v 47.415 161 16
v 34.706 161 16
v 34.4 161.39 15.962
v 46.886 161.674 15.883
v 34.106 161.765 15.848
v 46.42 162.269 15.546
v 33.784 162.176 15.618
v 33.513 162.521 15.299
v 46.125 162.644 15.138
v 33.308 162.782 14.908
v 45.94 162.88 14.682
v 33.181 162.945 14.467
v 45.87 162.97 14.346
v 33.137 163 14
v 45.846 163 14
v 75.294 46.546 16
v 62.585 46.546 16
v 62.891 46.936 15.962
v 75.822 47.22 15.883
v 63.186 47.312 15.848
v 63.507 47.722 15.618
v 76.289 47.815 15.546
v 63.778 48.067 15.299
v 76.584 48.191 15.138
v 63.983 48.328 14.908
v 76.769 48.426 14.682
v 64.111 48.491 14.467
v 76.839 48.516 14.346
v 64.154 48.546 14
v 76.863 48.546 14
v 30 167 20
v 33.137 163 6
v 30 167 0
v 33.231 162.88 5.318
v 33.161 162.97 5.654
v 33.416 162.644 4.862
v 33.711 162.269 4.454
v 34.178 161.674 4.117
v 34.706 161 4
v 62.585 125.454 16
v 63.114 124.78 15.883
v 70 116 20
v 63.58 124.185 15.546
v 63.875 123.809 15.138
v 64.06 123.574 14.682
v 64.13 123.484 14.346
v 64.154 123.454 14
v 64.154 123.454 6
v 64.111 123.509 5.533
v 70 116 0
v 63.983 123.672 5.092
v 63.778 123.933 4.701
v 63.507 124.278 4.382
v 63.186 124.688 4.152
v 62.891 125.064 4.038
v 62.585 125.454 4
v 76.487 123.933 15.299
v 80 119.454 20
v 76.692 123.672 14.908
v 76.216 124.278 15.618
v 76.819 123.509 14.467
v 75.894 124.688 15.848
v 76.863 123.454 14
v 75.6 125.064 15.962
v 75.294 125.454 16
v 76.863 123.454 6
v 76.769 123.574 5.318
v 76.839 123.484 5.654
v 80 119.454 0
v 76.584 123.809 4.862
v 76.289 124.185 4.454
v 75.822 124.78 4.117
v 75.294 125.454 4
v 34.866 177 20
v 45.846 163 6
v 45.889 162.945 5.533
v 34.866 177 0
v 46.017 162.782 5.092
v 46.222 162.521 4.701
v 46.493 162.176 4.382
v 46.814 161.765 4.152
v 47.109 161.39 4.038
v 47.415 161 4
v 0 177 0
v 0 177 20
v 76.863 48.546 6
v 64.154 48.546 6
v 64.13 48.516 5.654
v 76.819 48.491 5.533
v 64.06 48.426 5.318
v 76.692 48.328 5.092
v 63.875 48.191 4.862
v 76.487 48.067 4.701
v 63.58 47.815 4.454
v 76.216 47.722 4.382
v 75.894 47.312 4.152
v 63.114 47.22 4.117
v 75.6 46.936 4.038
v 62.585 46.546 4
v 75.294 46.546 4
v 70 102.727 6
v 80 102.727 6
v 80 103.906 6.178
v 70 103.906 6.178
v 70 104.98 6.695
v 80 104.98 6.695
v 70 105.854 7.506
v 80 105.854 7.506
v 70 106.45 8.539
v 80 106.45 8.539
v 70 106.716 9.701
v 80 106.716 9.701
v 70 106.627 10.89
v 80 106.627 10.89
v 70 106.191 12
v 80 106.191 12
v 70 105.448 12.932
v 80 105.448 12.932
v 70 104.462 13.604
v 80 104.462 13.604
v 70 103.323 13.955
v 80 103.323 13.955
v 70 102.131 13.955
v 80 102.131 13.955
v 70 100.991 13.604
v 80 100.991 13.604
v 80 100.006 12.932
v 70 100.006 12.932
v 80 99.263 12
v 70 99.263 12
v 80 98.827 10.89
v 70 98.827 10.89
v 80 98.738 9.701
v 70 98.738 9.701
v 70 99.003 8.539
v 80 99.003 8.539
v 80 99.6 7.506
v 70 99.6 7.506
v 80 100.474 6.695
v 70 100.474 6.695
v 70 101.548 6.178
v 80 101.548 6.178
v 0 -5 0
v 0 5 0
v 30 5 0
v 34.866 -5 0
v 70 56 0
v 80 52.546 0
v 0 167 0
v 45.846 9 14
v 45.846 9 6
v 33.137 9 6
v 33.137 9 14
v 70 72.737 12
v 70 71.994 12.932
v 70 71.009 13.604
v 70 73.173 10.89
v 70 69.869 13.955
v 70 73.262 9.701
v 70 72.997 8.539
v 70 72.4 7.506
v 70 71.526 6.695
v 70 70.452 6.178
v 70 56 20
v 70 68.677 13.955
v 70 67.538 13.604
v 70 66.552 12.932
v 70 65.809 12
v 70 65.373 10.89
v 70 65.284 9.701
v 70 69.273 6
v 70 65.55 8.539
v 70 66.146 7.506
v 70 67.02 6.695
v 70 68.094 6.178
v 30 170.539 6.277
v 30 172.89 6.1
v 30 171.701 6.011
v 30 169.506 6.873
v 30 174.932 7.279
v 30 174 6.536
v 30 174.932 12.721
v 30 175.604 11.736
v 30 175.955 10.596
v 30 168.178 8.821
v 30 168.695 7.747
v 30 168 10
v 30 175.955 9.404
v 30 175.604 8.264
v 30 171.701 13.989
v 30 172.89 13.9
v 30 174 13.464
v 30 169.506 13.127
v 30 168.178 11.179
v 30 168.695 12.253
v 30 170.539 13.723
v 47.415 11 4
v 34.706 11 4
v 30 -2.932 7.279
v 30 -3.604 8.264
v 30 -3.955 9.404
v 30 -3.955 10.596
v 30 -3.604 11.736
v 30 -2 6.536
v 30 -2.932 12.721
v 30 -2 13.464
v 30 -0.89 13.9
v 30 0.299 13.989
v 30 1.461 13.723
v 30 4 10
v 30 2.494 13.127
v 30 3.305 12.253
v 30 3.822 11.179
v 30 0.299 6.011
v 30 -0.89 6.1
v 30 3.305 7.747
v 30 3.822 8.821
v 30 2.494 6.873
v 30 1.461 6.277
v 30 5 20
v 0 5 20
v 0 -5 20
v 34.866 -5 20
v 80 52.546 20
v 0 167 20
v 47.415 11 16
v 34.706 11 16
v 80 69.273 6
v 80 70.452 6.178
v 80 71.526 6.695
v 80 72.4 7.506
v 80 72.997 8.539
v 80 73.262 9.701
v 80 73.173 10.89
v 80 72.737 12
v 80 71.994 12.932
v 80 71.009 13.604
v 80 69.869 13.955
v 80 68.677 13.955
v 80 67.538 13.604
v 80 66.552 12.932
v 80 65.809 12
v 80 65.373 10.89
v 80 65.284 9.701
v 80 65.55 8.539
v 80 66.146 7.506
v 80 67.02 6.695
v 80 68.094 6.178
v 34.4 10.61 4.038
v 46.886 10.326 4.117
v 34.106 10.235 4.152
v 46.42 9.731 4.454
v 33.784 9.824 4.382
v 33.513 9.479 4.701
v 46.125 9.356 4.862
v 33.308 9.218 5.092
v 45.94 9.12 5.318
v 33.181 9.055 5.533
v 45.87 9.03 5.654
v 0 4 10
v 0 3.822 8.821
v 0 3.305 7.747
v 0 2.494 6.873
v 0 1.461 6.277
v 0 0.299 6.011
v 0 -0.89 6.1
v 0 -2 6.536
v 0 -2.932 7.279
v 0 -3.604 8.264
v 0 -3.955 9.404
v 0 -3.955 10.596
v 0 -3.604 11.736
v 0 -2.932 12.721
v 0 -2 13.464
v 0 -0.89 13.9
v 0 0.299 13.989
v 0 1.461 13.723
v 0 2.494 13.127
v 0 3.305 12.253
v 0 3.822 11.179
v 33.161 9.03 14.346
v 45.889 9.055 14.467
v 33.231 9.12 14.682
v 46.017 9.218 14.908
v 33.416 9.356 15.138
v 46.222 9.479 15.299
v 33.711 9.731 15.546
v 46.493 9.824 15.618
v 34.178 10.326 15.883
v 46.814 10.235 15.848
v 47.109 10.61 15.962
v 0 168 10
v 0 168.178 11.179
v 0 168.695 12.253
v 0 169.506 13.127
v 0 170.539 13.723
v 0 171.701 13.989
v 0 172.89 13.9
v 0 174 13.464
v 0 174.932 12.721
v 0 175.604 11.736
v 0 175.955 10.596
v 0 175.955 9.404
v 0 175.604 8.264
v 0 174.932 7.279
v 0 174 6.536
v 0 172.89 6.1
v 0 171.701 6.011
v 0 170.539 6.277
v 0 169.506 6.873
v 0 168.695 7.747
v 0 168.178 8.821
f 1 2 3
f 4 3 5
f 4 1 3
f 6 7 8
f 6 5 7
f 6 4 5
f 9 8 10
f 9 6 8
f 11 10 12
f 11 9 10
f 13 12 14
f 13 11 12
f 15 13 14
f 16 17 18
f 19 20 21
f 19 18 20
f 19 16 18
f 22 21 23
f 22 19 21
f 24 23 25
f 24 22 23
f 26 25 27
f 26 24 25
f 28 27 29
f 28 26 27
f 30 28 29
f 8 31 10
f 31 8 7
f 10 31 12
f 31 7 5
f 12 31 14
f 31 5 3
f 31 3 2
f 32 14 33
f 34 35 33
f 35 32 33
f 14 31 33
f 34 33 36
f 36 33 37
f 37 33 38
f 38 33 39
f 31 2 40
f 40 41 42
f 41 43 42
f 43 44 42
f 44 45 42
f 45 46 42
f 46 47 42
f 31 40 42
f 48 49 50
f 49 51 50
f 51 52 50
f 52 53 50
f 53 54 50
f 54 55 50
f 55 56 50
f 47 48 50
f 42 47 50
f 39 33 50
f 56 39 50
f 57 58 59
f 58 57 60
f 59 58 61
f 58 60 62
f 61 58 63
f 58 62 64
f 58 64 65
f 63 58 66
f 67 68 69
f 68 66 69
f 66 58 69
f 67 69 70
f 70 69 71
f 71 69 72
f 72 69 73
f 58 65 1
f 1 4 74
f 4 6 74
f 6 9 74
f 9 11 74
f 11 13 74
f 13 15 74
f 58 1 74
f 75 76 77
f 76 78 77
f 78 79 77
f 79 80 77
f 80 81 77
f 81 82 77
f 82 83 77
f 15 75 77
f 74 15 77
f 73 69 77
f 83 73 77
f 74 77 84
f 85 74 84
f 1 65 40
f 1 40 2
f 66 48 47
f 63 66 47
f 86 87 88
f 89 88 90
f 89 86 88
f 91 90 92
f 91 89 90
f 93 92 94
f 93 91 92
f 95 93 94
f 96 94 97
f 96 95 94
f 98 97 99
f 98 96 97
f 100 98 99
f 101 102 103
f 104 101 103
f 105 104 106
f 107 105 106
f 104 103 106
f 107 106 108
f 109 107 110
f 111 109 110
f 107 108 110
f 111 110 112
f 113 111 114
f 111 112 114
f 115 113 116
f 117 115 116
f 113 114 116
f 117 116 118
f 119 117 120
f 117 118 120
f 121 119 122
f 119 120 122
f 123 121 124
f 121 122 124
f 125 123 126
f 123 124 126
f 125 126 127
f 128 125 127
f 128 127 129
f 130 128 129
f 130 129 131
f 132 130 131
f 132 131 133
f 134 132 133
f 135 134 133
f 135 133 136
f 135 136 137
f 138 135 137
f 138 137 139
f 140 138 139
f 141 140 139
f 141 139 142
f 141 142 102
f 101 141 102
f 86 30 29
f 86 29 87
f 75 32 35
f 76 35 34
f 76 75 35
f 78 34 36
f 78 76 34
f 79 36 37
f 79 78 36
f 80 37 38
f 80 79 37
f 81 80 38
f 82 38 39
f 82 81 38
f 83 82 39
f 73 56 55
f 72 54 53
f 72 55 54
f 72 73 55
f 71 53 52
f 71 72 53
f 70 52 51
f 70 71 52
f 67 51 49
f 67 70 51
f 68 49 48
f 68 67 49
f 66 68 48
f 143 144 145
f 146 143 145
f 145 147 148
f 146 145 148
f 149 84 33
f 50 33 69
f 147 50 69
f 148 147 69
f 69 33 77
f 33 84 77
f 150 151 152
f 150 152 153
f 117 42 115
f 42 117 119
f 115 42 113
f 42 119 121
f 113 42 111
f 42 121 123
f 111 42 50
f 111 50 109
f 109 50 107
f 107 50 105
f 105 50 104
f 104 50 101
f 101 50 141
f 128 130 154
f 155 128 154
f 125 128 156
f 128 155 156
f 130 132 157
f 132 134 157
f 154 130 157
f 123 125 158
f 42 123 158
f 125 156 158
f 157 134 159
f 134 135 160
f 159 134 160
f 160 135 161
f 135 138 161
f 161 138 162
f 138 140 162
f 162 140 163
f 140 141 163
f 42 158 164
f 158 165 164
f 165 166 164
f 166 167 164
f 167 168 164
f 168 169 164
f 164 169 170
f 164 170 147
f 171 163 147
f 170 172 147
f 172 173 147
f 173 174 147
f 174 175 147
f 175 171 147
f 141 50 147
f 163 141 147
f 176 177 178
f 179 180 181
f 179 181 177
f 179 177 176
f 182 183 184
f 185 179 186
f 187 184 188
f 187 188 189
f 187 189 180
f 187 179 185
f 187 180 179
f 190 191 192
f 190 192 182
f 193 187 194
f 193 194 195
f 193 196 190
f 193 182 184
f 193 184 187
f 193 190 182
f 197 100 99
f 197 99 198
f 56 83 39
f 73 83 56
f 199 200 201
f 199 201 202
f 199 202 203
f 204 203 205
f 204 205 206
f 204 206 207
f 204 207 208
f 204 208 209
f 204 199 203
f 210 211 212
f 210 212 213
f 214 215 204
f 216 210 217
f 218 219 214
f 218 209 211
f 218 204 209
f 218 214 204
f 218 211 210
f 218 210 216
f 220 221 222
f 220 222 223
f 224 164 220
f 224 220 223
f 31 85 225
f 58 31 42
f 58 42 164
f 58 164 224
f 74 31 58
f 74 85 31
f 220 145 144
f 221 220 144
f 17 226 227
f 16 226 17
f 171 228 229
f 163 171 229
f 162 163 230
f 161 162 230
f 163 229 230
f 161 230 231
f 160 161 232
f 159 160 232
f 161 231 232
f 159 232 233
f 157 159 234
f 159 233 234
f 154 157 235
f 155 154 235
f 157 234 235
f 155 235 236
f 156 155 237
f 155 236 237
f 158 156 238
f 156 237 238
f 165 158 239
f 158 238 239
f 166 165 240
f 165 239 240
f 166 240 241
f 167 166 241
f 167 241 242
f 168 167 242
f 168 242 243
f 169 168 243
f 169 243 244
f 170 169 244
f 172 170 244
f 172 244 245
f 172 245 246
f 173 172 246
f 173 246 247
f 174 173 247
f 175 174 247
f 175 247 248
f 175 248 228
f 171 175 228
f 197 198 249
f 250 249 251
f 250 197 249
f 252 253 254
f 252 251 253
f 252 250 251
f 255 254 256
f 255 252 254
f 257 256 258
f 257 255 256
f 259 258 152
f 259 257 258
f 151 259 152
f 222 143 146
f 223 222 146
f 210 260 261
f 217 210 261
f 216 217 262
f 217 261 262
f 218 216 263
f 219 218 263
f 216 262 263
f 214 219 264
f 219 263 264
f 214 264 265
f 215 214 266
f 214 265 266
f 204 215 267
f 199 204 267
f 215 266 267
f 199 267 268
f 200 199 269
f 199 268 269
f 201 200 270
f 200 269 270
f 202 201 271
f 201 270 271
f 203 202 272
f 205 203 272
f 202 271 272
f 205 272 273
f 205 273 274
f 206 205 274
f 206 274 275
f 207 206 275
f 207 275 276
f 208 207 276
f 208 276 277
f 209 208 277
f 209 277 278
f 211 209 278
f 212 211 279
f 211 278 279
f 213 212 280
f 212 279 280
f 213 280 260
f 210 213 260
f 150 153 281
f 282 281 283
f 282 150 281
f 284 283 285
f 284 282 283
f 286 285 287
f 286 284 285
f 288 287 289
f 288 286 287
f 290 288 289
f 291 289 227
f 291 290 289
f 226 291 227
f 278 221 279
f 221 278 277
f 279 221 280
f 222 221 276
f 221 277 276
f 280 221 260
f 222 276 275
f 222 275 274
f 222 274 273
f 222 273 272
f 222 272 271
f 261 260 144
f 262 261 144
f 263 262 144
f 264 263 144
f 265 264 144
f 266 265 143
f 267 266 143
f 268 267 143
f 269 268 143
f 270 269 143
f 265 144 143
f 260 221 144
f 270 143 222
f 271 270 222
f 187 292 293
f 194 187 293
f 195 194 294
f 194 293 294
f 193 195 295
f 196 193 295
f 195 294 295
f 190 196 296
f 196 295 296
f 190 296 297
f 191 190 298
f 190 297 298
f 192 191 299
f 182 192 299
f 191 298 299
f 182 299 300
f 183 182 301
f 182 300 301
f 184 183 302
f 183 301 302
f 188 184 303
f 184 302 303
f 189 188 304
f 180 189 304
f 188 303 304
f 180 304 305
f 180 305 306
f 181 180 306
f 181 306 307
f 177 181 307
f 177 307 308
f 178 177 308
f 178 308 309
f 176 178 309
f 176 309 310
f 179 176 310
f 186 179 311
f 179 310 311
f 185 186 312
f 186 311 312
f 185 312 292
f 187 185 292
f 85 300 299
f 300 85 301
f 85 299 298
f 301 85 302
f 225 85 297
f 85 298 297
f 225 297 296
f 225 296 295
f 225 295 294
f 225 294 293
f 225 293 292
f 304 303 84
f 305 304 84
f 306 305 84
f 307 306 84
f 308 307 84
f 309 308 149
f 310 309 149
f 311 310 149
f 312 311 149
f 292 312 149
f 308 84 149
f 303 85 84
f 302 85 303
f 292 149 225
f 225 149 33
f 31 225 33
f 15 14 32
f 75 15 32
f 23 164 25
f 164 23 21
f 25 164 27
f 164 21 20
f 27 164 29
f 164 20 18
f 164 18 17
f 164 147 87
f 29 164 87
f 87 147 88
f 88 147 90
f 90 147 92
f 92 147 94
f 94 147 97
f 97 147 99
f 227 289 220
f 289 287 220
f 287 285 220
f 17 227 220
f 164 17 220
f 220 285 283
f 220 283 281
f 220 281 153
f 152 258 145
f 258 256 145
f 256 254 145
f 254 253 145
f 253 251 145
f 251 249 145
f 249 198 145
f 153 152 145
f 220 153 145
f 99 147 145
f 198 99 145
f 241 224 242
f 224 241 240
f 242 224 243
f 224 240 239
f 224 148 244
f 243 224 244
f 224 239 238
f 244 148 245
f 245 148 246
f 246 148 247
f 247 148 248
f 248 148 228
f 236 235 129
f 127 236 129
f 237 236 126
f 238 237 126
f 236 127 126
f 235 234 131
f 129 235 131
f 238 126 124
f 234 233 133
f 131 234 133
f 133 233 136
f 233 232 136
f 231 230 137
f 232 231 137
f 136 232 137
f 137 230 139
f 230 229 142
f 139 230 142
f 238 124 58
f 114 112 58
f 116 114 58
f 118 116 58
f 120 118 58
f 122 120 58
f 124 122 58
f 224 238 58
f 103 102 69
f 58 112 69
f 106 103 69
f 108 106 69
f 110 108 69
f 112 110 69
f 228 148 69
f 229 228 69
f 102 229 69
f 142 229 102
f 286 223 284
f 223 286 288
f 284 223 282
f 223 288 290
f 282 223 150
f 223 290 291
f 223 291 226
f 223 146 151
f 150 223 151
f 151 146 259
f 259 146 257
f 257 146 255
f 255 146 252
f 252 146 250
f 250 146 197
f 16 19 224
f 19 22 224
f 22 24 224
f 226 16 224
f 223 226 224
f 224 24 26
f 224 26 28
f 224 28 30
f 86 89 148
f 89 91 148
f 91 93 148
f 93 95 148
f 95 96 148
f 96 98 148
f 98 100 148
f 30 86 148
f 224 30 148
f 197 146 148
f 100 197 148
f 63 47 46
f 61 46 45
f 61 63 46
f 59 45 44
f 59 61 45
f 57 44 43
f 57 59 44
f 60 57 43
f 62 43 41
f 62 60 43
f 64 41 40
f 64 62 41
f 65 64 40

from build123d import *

# Parameters (mm, degrees)
BOSS_EXTRUDE1_DEPTH = 20
SKETCH2_R           = 4
CUT_EXTRUDE1_DEPTH  = 30
SKETCH3_R           = 4
CUT_EXTRUDE2_DEPTH  = 30
CUT_EXTRUDE3_DEPTH  = 87


with BuildPart() as part:
    # Sketch1 → Boss-Extrude1 (new body)
    with BuildSketch(Plane.XY):
        Polygon((0, 177), (0, 167), (30, 167), (70, 116), (70, 56), (30, 5), (0, 5), (0, -5), (34.865710136, -5), (80, 52.546219577), (80, 119.453780423), (34.865710136, 177), align=None)
    extrude(amount=BOSS_EXTRUDE1_DEPTH)

    # Sketch2 → Cut-Extrude1 (cut)
    with BuildSketch(Plane.ZY):
        with Locations(Location((10, 172, 0), (0, 0, 270))):
            Circle(SKETCH2_R)
        with Locations(Location((10, 0, 0), (0, 0, 90))):
            Circle(SKETCH2_R)
    extrude(amount=-CUT_EXTRUDE1_DEPTH, mode=Mode.SUBTRACT)

    # Sketch3 → Cut-Extrude2 (cut)
    with BuildSketch(Plane(origin=(80, 0, 0), x_dir=(0, 0, -1), z_dir=(1, 0, 0))):
        with Locations((-10, 102.726890212)):
            Circle(SKETCH3_R)
        with Locations((-10, 69.273109788)):
            Circle(SKETCH3_R)
    extrude(amount=-CUT_EXTRUDE2_DEPTH, mode=Mode.SUBTRACT)

    # Sketch4 → Cut-Extrude3 (cut)
    with BuildSketch(Plane(origin=(80, 0, 0), x_dir=(0, 0, -1), z_dir=(1, 0, 0))):
        with BuildLine():
            Line((-14, 163), (-6, 163))
            ThreePointArc((-6, 163), (-4.585786438, 162.414213562), (-4, 161))
            Line((-4, 161), (-4, 125.453780423))
            ThreePointArc((-4, 125.453780423), (-4.585786438, 124.039566861), (-6, 123.453780423))
            Line((-6, 123.453780423), (-14, 123.453780423))
            ThreePointArc((-14, 123.453780423), (-15.414213562, 124.039566861), (-16, 125.453780423))
            Line((-16, 125.453780423), (-16, 161))
            ThreePointArc((-16, 161), (-15.414213562, 162.414213562), (-14, 163))
        make_face()
        with BuildLine():
            Line((-14, 48.546219577), (-6, 48.546219577))
            ThreePointArc((-6, 48.546219577), (-4.585786438, 47.960433139), (-4, 46.546219577))
            Line((-4, 46.546219577), (-4, 11))
            ThreePointArc((-4, 11), (-4.585786438, 9.585786438), (-6, 9))
            Line((-6, 9), (-14, 9))
            ThreePointArc((-14, 9), (-15.414213562, 9.585786438), (-16, 11))
            Line((-16, 11), (-16, 46.546219577))
            ThreePointArc((-16, 46.546219577), (-15.414213562, 47.960433139), (-14, 48.546219577))
        make_face()
    extrude(amount=-CUT_EXTRUDE3_DEPTH, mode=Mode.SUBTRACT)


solid = part.part
